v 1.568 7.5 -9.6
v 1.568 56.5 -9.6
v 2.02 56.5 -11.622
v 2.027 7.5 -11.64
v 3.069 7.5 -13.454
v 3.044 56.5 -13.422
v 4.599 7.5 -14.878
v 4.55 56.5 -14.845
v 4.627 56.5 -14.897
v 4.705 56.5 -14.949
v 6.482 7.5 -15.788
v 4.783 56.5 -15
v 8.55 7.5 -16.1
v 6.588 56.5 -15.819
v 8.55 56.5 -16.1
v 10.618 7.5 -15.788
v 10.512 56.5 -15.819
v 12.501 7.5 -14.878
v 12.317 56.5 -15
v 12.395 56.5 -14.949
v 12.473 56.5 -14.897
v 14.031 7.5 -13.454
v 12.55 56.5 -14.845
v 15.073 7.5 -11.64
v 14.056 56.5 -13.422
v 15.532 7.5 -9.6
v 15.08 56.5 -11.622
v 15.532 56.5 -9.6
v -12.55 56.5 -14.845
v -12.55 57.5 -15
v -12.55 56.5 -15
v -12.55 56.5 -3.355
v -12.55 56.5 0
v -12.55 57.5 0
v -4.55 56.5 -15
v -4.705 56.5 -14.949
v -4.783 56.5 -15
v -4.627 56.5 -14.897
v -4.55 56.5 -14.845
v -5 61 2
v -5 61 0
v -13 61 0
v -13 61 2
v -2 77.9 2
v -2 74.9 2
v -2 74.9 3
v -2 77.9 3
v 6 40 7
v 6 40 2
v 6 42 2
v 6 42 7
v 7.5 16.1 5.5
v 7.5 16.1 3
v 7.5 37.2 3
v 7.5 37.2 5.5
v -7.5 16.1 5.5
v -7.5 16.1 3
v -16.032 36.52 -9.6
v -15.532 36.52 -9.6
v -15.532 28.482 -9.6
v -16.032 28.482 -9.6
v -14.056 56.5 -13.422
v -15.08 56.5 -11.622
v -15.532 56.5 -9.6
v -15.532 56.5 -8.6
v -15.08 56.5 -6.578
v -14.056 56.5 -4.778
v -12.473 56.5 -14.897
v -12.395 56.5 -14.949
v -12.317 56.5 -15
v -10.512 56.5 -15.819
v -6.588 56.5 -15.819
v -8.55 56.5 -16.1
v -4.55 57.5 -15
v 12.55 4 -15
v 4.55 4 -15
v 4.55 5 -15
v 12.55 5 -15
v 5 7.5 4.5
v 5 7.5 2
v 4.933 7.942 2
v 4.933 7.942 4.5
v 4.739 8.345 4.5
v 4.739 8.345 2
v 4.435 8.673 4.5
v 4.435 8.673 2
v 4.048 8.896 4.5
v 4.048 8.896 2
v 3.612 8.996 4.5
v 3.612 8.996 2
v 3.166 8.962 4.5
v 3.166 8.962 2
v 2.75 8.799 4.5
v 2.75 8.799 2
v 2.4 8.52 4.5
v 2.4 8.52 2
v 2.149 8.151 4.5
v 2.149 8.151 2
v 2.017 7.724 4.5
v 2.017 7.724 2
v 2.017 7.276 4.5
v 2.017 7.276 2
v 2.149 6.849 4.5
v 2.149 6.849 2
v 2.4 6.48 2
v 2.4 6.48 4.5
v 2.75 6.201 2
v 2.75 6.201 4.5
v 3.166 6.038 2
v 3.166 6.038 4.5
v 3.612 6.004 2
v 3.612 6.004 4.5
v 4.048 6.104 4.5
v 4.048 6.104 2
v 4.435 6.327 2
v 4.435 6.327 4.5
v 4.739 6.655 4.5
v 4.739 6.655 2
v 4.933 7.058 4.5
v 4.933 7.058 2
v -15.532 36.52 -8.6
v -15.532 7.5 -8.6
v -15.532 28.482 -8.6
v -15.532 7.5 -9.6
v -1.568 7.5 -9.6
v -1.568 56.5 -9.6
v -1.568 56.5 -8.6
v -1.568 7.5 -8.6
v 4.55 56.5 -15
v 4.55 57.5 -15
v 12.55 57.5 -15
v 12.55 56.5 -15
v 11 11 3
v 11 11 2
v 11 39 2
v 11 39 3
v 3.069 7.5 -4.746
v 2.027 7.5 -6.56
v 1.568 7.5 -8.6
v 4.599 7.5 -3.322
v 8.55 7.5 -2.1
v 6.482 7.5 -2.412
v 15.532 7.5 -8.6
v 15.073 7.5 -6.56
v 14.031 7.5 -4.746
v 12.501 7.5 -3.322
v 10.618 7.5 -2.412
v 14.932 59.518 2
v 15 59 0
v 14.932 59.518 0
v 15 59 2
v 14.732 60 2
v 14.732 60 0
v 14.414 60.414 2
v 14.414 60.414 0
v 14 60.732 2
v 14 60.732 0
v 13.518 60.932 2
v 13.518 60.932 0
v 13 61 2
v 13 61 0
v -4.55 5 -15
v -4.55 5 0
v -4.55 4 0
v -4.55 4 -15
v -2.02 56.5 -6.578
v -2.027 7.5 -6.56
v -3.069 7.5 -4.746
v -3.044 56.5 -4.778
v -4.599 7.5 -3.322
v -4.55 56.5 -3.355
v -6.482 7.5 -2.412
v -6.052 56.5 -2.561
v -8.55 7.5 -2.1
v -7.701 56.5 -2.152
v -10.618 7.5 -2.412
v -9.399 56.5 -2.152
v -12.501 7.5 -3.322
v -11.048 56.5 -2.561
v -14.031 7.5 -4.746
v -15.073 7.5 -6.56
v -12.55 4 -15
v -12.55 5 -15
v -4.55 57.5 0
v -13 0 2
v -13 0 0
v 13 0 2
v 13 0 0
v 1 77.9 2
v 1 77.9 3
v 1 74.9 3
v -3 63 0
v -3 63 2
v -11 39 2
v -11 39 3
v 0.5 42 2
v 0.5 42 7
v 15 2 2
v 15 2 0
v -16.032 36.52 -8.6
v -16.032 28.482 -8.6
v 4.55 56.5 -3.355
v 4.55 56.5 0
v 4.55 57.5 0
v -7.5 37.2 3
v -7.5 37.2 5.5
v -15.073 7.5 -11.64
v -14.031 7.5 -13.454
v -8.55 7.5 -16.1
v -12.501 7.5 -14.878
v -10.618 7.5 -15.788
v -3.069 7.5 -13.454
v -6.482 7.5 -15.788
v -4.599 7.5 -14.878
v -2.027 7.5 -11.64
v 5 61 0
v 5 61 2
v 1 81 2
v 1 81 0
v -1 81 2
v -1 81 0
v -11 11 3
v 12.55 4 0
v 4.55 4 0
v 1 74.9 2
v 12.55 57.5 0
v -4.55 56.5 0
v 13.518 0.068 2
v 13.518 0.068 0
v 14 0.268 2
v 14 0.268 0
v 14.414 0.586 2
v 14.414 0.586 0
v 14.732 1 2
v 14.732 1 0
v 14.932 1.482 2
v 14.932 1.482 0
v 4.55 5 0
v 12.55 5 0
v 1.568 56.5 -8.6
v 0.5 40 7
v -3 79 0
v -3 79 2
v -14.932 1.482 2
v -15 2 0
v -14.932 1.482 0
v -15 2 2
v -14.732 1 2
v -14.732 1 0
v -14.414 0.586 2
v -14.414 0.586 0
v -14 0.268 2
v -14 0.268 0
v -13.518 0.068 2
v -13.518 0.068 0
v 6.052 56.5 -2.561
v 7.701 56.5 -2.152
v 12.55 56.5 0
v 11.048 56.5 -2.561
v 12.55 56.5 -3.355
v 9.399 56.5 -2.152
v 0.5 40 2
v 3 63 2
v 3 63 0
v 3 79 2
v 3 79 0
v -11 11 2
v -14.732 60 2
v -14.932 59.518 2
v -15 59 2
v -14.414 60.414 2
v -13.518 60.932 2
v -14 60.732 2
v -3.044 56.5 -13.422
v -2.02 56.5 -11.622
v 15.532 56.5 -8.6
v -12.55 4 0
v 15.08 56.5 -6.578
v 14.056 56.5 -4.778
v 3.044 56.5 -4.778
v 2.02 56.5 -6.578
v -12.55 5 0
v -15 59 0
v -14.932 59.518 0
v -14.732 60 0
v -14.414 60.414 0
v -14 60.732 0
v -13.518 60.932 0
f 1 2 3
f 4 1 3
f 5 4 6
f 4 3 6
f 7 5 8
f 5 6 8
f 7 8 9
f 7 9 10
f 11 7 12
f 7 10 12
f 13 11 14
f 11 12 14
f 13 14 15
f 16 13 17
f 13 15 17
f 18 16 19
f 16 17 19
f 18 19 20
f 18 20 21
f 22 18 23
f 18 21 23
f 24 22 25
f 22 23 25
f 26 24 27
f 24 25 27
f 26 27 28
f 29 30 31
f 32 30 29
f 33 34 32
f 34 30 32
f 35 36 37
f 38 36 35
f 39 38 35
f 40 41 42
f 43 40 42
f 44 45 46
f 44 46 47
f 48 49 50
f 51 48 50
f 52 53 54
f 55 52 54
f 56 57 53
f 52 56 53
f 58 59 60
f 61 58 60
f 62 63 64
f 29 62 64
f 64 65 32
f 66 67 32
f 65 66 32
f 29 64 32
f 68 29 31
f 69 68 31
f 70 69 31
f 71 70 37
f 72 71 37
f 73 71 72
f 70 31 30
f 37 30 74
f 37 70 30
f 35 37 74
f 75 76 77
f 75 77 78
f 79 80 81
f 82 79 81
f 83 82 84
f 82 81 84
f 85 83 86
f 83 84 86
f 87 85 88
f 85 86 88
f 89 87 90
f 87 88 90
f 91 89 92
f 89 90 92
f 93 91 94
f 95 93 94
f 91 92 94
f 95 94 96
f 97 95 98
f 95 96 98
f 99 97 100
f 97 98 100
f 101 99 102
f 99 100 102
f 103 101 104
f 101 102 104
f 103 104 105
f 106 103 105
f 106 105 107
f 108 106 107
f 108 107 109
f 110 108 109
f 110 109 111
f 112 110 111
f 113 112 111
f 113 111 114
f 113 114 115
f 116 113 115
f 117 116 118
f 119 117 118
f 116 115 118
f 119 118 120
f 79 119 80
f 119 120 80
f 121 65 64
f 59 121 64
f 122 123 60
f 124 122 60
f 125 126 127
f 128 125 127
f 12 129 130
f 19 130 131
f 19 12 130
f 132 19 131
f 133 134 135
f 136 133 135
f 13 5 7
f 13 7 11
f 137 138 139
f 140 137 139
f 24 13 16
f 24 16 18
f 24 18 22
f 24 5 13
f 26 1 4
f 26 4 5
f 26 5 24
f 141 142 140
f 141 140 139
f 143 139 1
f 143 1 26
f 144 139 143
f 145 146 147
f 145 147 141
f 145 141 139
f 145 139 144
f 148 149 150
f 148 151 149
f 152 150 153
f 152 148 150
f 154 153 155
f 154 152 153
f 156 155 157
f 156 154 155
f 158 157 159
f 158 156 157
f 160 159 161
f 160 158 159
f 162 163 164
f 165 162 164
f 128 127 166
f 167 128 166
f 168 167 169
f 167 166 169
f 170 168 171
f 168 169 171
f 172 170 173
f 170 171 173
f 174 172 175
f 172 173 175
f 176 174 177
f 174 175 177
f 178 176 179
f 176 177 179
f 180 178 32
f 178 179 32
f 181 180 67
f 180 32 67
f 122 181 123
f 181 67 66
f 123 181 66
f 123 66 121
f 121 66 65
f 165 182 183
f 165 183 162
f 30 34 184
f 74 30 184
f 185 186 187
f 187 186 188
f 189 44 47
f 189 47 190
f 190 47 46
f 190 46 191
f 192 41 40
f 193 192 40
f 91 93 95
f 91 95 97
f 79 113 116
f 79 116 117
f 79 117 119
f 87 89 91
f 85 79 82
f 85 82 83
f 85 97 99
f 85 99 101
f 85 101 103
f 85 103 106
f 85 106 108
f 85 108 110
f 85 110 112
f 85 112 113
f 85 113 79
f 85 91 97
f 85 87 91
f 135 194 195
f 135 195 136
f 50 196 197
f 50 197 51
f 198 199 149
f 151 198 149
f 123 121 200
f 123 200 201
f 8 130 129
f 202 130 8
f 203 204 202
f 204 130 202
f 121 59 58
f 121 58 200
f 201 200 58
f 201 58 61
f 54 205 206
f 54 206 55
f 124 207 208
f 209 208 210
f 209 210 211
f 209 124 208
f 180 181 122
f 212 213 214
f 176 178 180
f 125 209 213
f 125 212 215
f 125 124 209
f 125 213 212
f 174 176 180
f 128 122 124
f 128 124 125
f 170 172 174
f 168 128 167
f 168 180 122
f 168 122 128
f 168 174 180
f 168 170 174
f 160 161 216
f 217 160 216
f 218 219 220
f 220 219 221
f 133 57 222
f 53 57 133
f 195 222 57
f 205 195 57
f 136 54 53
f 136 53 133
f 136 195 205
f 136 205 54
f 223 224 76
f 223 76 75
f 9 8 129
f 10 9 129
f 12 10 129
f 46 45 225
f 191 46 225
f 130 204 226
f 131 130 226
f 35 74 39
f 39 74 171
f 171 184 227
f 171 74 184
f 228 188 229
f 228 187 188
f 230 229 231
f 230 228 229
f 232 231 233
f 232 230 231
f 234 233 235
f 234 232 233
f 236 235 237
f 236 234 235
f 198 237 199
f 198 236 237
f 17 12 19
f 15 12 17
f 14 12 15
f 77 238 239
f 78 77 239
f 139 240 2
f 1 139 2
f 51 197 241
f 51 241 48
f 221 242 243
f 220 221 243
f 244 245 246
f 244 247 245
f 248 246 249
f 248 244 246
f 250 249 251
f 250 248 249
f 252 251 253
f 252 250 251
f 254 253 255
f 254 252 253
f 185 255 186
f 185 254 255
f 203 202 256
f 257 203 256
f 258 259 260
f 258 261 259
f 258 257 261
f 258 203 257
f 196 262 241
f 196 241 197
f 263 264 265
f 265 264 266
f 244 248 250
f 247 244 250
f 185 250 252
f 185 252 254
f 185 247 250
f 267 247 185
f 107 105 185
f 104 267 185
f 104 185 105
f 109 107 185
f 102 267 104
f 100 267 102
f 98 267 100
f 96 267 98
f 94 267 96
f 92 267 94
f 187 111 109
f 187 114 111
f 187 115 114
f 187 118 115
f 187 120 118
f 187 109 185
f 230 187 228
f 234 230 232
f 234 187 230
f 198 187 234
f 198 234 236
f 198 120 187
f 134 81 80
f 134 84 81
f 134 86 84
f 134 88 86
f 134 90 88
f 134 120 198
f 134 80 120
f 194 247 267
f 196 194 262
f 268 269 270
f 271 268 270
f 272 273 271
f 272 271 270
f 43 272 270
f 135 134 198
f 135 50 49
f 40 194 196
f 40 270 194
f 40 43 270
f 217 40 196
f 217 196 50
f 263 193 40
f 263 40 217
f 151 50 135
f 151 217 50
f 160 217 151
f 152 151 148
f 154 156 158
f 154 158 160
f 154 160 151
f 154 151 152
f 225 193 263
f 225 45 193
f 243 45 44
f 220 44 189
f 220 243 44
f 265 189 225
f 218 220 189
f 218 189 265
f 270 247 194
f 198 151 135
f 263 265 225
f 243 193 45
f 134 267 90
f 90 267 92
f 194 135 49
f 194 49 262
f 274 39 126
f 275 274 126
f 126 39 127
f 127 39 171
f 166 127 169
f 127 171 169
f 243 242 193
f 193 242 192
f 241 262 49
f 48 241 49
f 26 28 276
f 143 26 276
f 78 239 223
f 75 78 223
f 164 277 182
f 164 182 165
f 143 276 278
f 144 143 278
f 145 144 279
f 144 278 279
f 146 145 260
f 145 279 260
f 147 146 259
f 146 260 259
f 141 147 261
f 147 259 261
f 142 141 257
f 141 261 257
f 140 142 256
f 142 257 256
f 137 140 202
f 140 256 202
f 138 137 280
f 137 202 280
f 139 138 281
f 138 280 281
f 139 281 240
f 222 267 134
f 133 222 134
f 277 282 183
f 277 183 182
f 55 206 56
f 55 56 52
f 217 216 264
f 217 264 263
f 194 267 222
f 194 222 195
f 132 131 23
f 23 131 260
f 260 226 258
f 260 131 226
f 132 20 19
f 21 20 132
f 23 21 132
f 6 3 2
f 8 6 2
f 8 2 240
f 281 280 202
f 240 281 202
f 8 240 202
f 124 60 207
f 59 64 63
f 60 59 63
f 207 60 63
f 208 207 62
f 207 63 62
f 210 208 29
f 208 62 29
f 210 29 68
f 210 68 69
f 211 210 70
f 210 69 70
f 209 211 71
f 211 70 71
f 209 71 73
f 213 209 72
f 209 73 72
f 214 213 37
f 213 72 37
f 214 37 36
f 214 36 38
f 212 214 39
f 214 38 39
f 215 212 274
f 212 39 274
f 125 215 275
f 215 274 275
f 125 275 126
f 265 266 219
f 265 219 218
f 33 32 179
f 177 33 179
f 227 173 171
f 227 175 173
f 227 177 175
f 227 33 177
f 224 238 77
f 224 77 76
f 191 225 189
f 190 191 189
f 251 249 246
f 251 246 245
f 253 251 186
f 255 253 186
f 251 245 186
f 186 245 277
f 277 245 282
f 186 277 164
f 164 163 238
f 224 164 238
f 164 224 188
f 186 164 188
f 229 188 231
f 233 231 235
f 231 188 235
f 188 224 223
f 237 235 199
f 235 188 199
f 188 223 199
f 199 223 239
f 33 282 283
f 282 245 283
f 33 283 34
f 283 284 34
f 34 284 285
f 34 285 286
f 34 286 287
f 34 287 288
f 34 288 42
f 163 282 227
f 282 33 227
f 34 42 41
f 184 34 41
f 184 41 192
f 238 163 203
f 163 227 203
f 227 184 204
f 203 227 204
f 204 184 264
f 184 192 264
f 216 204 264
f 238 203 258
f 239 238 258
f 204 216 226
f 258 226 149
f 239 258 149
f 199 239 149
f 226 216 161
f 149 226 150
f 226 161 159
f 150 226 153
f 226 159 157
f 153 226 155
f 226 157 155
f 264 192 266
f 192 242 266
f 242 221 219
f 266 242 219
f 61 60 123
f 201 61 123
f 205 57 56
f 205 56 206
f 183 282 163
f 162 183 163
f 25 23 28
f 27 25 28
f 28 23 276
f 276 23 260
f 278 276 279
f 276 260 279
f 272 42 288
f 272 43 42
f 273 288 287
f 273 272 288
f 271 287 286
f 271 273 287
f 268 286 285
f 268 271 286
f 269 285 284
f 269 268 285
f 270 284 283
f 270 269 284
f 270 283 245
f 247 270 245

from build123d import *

# Parameters (mm, degrees)
F1_DEPTH  = 2
F2_W      = 22
F2_H      = 28
F3_DEPTH  = 1
F4_W      = 15
F4_H      = 21.1
F5_DEPTH  = 2.5
F6_W      = 5.5
F6_H      = 2
F7_DEPTH  = 5
F8_W      = 3
F8_H      = 3
F9_DEPTH  = 1
F10_R     = 1.5
F11_DEPTH = 2.5
F12_W     = 8
F12_H     = 1
F13_DEPTH = 15
F15_DEPTH = 49
F16_SIZE  = 2
F17_R     = 2
F18_W     = 8.038238
F18_H     = 1
F19_DEPTH = 0.5


with BuildPart() as f1:
    # F0 (on Top) → F1 (new body)
    with BuildSketch(Plane.XY):
        Polygon((-15, 61), (-15, 0), (15, 0), (15, 61), (3, 61), (3, 81), (-3, 81), (-3, 61), align=None)
    extrude(amount=F1_DEPTH)

    # F2 (on face) → F3 (join)
    with BuildSketch(Plane.XY.offset(2)):
        with Locations((0, 25)):
            Rectangle(F2_W, F2_H)
    extrude(amount=F3_DEPTH)

    # F4 (on face) → F5 (join)
    with BuildSketch(Plane.XY.offset(3)):
        with Locations((0, 26.65)):
            Rectangle(F4_W, F4_H)
    extrude(amount=F5_DEPTH)

    # F6 (on face) → F7 (join)
    with BuildSketch(Plane.XY.offset(2)):
        with Locations((3.25, 41)):
            Rectangle(F6_W, F6_H)
    extrude(amount=F7_DEPTH)

    # F8 (on face) → F9 (join)
    with BuildSketch(Plane.XY.offset(2)):
        with Locations((-0.5, 76.4)):
            Rectangle(F8_W, F8_H)
    extrude(amount=F9_DEPTH)

    # F10 (on face) → F11 (join)
    with BuildSketch(Plane.XY.offset(2)):
        with Locations((3.5, 7.5)):
            Circle(F10_R)
    extrude(amount=F11_DEPTH)

    # F12 (on face) → F13 (join)
    with BuildSketch(Plane(origin=(0, 0, 0), x_dir=(1, 0, 0), z_dir=(0, 0, -1))):
        with Locations((8.55, -4.5)):
            Rectangle(F12_W, F12_H)
        with Locations((-8.55, -4.5)):
            Rectangle(F12_W, F12_H)
        with Locations((8.55, -57)):
            Rectangle(F12_W, F12_H)
        with Locations((-8.55, -57)):
            Rectangle(F12_W, F12_H)
    extrude(amount=F13_DEPTH)

    # F14 (on face) → F15 (join)
    with BuildSketch(Plane.XZ.offset(-56.5)):
        with BuildLine():
            Line((15.53212, -9.6), (15.53212, -8.6))
            ThreePointArc((15.53212, -8.6), (8.55, -2.1), (1.56788, -8.6))
            Line((1.56788, -8.6), (1.56788, -9.6))
            ThreePointArc((1.56788, -9.6), (8.55, -16.1), (15.53212, -9.6))
        make_face()
        with BuildLine():
            ThreePointArc((-15.53212, -9.6), (-8.55, -16.1), (-1.56788, -9.6))
            Line((-1.56788, -9.6), (-1.56788, -8.6))
            ThreePointArc((-1.56788, -8.6), (-8.55, -2.1), (-15.53212, -8.6))
            Line((-15.53212, -8.6), (-15.53212, -9.6))
        make_face()
    extrude(amount=F15_DEPTH)

    # F16
    f16_edges = [f1.edges().sort_by_distance(p)[0] for p in [
        (-3, 61, 1),
        (3, 61, 1),
        (3, 81, 1),
        (-3, 81, 1),
    ]]
    chamfer(f16_edges, length=F16_SIZE)

    # F17
    f17_edges = [f1.edges().sort_by_distance(p)[0] for p in [
        (15, 61, 1),
        (-15, 61, 1),
        (15, 0, 1),
        (-15, 0, 1),
    ]]
    fillet(f17_edges, radius=F17_R)

    # F18 (on face) → F19 (join)
    with BuildSketch(Plane(origin=(-15.53212, 0, 0), x_dir=(0, -1, 0), z_dir=(-1, 0, 0))):
        with Locations((-32.501247, -9.1)):
            Rectangle(F18_W, F18_H)
    extrude(amount=F19_DEPTH)


solid = f1.part
